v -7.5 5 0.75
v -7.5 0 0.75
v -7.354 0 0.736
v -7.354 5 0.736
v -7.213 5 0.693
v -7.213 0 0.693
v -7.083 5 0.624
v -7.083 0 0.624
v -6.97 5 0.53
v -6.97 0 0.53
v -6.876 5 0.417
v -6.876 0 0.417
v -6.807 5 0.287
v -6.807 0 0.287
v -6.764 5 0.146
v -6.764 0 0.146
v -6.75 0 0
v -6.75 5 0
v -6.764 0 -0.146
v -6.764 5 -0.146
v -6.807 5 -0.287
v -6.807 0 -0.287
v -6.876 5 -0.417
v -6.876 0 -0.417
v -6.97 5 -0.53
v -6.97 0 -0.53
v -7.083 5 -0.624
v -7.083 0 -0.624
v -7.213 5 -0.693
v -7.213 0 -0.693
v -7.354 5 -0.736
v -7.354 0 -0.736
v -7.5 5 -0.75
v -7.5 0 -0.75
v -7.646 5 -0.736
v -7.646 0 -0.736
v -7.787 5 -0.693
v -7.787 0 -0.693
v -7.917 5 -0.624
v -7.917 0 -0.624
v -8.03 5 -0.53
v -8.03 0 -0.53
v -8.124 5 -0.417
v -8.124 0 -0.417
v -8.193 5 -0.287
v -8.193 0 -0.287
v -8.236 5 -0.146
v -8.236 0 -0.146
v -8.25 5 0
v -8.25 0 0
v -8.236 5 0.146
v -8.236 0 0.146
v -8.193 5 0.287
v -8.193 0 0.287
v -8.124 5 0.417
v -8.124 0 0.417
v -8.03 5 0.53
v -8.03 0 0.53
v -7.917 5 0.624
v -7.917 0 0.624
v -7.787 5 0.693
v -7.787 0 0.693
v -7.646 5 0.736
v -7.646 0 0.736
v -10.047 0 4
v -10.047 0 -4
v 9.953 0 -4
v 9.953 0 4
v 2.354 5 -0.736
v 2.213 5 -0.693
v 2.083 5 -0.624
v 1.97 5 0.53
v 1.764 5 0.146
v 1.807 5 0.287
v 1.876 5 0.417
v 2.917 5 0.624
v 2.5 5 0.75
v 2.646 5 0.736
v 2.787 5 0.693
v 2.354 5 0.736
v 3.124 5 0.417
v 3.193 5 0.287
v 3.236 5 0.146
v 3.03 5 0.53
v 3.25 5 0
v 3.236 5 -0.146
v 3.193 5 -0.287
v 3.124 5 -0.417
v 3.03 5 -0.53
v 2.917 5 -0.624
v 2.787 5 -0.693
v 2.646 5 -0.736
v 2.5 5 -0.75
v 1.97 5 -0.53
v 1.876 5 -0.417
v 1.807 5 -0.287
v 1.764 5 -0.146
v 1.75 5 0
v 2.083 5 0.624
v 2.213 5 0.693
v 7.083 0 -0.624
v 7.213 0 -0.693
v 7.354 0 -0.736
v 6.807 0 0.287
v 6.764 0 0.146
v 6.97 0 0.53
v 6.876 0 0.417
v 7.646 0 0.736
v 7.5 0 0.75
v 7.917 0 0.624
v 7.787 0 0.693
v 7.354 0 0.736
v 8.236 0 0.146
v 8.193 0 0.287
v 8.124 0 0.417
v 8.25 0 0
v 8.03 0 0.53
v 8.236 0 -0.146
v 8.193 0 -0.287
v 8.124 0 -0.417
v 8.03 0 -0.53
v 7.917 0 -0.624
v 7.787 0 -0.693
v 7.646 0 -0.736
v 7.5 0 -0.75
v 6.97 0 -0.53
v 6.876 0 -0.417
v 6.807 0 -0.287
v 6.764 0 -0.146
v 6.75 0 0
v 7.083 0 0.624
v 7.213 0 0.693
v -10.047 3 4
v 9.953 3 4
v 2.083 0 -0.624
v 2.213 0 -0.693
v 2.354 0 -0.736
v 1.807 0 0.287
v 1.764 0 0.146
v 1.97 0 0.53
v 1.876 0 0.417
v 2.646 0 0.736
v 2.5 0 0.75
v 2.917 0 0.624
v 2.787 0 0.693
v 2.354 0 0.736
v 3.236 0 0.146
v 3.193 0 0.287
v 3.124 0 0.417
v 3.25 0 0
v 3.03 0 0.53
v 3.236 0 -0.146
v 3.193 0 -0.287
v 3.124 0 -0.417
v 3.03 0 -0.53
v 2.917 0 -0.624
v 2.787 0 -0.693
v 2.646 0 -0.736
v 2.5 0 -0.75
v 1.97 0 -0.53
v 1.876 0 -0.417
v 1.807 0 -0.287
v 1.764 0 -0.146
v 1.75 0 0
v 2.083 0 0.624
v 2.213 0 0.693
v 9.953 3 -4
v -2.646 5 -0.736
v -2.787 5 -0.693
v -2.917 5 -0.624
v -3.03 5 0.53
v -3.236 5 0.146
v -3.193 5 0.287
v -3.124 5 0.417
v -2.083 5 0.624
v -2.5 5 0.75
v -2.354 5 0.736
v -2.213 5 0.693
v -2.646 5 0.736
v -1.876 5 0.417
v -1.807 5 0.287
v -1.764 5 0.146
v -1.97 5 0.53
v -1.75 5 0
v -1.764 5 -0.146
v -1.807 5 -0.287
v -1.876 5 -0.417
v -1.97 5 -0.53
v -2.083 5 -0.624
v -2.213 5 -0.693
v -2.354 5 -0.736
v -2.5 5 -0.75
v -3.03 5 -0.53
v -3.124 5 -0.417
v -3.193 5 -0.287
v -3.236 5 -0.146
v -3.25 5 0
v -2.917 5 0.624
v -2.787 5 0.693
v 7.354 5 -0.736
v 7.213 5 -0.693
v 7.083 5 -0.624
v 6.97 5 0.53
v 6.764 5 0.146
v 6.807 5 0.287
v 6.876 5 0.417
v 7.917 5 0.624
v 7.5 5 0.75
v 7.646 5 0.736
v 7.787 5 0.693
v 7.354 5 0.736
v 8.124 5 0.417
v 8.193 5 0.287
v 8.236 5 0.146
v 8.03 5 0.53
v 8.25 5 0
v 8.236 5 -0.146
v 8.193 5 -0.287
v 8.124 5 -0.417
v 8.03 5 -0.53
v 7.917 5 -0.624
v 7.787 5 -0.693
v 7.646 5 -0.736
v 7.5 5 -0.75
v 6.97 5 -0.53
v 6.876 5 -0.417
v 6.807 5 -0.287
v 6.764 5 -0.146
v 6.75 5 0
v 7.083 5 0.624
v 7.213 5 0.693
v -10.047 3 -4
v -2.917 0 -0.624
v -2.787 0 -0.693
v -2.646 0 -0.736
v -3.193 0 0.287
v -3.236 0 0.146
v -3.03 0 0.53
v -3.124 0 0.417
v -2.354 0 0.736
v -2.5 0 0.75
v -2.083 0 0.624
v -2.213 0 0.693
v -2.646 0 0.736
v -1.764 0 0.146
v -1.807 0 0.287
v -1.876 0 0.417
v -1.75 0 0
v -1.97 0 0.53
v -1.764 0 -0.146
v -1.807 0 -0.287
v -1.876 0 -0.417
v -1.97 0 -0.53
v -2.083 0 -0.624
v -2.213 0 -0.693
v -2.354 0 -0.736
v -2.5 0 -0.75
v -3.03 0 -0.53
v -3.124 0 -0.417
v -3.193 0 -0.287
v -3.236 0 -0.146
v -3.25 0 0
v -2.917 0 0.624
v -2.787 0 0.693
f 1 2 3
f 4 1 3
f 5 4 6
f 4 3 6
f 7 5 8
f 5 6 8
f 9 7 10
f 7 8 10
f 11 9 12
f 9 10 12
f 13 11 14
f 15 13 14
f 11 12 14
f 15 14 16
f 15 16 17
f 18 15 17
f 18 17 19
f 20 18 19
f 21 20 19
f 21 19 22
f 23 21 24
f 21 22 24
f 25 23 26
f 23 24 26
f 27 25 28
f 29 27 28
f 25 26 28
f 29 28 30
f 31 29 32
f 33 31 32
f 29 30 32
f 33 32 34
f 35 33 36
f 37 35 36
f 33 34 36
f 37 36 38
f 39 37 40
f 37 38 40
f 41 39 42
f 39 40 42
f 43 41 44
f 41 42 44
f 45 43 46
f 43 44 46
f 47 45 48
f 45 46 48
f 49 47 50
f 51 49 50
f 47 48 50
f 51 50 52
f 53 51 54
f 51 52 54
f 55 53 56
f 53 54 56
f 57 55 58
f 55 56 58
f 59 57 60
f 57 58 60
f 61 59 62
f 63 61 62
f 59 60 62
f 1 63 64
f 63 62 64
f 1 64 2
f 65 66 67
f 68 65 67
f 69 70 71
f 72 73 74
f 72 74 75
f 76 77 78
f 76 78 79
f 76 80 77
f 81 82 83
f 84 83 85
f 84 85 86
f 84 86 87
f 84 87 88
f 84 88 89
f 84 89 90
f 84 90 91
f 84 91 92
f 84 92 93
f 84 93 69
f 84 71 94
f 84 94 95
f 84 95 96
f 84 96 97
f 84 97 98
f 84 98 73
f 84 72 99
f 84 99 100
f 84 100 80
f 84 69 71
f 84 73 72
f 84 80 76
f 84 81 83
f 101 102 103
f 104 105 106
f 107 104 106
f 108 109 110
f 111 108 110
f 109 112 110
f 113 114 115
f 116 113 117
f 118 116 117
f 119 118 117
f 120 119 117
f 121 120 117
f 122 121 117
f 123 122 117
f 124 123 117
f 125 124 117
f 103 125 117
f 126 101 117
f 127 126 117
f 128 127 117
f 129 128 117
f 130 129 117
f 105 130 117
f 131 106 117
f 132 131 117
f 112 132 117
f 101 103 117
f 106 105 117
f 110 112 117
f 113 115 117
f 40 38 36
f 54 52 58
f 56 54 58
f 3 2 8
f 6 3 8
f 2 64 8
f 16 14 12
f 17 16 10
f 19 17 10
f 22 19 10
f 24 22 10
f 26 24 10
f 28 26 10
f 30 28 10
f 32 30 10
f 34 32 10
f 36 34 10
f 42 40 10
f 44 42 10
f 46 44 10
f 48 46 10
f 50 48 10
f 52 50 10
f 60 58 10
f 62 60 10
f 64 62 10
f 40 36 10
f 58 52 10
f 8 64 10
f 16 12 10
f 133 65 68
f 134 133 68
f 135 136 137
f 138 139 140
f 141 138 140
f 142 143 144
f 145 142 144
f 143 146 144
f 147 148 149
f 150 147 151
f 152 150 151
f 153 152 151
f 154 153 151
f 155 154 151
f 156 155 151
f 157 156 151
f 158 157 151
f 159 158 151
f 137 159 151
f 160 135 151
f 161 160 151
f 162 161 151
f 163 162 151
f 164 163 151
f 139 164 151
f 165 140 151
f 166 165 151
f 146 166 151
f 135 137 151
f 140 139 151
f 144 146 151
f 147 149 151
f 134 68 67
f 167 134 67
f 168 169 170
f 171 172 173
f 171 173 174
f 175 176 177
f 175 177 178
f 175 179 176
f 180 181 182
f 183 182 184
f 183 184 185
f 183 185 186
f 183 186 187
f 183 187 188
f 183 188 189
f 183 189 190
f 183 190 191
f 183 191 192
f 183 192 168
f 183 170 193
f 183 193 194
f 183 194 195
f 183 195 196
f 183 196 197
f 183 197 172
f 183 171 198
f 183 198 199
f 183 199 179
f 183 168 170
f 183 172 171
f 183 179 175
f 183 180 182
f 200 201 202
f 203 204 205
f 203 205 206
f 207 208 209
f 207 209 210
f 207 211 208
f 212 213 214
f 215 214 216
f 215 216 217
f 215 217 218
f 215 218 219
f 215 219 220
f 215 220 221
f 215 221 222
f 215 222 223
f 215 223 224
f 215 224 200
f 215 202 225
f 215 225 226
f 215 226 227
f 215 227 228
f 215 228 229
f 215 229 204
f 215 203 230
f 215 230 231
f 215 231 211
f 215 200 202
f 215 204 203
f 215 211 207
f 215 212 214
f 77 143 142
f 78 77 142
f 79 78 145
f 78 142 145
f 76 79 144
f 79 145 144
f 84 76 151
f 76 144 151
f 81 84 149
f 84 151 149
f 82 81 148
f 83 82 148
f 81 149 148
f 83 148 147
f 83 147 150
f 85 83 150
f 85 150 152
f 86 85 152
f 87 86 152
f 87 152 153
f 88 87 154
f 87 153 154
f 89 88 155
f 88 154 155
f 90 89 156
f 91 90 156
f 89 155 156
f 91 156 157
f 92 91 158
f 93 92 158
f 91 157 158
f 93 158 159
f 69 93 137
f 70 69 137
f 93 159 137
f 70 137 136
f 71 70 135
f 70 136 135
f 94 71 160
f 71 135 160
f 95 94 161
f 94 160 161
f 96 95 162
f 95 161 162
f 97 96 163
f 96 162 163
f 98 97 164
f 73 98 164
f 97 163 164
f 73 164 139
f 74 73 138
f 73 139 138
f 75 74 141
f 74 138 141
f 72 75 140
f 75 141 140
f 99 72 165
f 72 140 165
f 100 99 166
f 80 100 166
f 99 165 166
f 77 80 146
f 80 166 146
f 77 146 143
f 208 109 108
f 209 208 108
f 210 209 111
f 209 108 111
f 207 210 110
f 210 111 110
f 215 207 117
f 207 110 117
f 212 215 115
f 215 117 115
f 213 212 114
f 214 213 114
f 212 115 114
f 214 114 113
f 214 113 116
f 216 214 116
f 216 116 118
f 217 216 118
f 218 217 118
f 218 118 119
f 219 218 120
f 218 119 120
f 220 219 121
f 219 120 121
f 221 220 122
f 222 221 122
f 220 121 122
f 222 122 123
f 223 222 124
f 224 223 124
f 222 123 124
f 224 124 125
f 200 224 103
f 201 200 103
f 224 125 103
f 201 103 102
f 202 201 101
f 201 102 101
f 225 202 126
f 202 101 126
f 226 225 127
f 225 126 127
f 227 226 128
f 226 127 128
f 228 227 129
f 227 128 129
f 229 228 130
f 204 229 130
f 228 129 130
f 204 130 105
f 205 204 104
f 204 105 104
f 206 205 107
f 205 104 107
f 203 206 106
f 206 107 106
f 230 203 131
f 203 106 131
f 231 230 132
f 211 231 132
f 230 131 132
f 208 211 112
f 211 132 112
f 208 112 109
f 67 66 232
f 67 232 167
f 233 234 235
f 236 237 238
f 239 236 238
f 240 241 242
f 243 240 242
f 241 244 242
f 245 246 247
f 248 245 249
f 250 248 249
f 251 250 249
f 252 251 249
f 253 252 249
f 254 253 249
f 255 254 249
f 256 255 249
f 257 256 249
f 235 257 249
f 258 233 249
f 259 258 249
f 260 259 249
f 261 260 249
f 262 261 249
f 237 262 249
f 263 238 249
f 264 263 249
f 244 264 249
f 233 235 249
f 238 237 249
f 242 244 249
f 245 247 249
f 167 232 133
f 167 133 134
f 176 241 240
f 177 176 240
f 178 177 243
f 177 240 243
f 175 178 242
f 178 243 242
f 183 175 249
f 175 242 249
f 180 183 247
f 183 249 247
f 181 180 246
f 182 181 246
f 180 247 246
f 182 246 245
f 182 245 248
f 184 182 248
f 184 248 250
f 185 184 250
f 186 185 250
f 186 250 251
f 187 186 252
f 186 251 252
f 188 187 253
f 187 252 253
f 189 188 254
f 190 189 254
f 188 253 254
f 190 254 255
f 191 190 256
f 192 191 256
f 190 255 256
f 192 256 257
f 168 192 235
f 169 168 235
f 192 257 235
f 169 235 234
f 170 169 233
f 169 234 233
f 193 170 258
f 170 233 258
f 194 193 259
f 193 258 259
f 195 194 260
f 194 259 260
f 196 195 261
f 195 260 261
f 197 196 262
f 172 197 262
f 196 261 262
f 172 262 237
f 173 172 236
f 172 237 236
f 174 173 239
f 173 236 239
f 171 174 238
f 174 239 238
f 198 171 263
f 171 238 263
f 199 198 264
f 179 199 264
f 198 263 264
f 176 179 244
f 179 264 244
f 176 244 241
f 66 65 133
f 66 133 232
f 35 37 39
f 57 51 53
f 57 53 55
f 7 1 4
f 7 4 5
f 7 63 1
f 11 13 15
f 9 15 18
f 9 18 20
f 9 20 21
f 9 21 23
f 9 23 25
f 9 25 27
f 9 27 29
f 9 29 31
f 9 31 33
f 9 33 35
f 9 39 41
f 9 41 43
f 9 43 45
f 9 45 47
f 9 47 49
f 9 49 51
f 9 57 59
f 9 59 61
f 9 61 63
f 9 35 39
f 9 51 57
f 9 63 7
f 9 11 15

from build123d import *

# Parameters (mm, degrees)
SKETCH1_W             = 20
SKETCH1_H             = 8
BOSS_EXTRUDE1_DEPTH   = 3
SKETCH2_R             = 0.75
BOSS_EXTRUDE2_DEPTH   = 5
BOSS_EXTRUDE2_2_DEPTH = 5
BOSS_EXTRUDE2_3_DEPTH = 5
BOSS_EXTRUDE2_4_DEPTH = 5


with BuildPart() as part:
    # Sketch1 → Boss-Extrude1 (new body)
    with BuildSketch(Plane(origin=(0, 0, 0), x_dir=(1, 0, 0), z_dir=(0, 1, 0))):
        with Locations((-0.046747686, 0)):
            Rectangle(SKETCH1_W, SKETCH1_H)
    extrude(amount=BOSS_EXTRUDE1_DEPTH)


with BuildPart() as body_2:
    # Sketch2 → Boss-Extrude2 (new body)
    with BuildSketch(Plane(origin=(0, 0, 0), x_dir=(1, 0, 0), z_dir=(0, 1, 0))):
        with Locations(Location((-7.5, 0, 0), (0, 0, 270))):
            Circle(SKETCH2_R)
    extrude(amount=BOSS_EXTRUDE2_DEPTH)


with BuildPart() as body_3:
    # Sketch2 → Boss-Extrude2 2 (new body)
    with BuildSketch(Plane(origin=(0, 0, 0), x_dir=(1, 0, 0), z_dir=(0, 1, 0))):
        with Locations(Location((-2.5, 0, 0), (0, 0, 270))):
            Circle(SKETCH2_R)
    extrude(amount=BOSS_EXTRUDE2_2_DEPTH)


with BuildPart() as body_4:
    # Sketch2 → Boss-Extrude2 3 (new body)
    with BuildSketch(Plane(origin=(0, 0, 0), x_dir=(1, 0, 0), z_dir=(0, 1, 0))):
        with Locations(Location((2.5, 0, 0), (0, 0, 270))):
            Circle(SKETCH2_R)
    extrude(amount=BOSS_EXTRUDE2_3_DEPTH)


with BuildPart() as body_5:
    # Sketch2 → Boss-Extrude2 4 (new body)
    with BuildSketch(Plane(origin=(0, 0, 0), x_dir=(1, 0, 0), z_dir=(0, 1, 0))):
        with Locations(Location((7.5, 0, 0), (0, 0, 270))):
            Circle(SKETCH2_R)
    extrude(amount=BOSS_EXTRUDE2_4_DEPTH)


solid = Compound([part.part, body_2.part, body_3.part, body_4.part, body_5.part])
